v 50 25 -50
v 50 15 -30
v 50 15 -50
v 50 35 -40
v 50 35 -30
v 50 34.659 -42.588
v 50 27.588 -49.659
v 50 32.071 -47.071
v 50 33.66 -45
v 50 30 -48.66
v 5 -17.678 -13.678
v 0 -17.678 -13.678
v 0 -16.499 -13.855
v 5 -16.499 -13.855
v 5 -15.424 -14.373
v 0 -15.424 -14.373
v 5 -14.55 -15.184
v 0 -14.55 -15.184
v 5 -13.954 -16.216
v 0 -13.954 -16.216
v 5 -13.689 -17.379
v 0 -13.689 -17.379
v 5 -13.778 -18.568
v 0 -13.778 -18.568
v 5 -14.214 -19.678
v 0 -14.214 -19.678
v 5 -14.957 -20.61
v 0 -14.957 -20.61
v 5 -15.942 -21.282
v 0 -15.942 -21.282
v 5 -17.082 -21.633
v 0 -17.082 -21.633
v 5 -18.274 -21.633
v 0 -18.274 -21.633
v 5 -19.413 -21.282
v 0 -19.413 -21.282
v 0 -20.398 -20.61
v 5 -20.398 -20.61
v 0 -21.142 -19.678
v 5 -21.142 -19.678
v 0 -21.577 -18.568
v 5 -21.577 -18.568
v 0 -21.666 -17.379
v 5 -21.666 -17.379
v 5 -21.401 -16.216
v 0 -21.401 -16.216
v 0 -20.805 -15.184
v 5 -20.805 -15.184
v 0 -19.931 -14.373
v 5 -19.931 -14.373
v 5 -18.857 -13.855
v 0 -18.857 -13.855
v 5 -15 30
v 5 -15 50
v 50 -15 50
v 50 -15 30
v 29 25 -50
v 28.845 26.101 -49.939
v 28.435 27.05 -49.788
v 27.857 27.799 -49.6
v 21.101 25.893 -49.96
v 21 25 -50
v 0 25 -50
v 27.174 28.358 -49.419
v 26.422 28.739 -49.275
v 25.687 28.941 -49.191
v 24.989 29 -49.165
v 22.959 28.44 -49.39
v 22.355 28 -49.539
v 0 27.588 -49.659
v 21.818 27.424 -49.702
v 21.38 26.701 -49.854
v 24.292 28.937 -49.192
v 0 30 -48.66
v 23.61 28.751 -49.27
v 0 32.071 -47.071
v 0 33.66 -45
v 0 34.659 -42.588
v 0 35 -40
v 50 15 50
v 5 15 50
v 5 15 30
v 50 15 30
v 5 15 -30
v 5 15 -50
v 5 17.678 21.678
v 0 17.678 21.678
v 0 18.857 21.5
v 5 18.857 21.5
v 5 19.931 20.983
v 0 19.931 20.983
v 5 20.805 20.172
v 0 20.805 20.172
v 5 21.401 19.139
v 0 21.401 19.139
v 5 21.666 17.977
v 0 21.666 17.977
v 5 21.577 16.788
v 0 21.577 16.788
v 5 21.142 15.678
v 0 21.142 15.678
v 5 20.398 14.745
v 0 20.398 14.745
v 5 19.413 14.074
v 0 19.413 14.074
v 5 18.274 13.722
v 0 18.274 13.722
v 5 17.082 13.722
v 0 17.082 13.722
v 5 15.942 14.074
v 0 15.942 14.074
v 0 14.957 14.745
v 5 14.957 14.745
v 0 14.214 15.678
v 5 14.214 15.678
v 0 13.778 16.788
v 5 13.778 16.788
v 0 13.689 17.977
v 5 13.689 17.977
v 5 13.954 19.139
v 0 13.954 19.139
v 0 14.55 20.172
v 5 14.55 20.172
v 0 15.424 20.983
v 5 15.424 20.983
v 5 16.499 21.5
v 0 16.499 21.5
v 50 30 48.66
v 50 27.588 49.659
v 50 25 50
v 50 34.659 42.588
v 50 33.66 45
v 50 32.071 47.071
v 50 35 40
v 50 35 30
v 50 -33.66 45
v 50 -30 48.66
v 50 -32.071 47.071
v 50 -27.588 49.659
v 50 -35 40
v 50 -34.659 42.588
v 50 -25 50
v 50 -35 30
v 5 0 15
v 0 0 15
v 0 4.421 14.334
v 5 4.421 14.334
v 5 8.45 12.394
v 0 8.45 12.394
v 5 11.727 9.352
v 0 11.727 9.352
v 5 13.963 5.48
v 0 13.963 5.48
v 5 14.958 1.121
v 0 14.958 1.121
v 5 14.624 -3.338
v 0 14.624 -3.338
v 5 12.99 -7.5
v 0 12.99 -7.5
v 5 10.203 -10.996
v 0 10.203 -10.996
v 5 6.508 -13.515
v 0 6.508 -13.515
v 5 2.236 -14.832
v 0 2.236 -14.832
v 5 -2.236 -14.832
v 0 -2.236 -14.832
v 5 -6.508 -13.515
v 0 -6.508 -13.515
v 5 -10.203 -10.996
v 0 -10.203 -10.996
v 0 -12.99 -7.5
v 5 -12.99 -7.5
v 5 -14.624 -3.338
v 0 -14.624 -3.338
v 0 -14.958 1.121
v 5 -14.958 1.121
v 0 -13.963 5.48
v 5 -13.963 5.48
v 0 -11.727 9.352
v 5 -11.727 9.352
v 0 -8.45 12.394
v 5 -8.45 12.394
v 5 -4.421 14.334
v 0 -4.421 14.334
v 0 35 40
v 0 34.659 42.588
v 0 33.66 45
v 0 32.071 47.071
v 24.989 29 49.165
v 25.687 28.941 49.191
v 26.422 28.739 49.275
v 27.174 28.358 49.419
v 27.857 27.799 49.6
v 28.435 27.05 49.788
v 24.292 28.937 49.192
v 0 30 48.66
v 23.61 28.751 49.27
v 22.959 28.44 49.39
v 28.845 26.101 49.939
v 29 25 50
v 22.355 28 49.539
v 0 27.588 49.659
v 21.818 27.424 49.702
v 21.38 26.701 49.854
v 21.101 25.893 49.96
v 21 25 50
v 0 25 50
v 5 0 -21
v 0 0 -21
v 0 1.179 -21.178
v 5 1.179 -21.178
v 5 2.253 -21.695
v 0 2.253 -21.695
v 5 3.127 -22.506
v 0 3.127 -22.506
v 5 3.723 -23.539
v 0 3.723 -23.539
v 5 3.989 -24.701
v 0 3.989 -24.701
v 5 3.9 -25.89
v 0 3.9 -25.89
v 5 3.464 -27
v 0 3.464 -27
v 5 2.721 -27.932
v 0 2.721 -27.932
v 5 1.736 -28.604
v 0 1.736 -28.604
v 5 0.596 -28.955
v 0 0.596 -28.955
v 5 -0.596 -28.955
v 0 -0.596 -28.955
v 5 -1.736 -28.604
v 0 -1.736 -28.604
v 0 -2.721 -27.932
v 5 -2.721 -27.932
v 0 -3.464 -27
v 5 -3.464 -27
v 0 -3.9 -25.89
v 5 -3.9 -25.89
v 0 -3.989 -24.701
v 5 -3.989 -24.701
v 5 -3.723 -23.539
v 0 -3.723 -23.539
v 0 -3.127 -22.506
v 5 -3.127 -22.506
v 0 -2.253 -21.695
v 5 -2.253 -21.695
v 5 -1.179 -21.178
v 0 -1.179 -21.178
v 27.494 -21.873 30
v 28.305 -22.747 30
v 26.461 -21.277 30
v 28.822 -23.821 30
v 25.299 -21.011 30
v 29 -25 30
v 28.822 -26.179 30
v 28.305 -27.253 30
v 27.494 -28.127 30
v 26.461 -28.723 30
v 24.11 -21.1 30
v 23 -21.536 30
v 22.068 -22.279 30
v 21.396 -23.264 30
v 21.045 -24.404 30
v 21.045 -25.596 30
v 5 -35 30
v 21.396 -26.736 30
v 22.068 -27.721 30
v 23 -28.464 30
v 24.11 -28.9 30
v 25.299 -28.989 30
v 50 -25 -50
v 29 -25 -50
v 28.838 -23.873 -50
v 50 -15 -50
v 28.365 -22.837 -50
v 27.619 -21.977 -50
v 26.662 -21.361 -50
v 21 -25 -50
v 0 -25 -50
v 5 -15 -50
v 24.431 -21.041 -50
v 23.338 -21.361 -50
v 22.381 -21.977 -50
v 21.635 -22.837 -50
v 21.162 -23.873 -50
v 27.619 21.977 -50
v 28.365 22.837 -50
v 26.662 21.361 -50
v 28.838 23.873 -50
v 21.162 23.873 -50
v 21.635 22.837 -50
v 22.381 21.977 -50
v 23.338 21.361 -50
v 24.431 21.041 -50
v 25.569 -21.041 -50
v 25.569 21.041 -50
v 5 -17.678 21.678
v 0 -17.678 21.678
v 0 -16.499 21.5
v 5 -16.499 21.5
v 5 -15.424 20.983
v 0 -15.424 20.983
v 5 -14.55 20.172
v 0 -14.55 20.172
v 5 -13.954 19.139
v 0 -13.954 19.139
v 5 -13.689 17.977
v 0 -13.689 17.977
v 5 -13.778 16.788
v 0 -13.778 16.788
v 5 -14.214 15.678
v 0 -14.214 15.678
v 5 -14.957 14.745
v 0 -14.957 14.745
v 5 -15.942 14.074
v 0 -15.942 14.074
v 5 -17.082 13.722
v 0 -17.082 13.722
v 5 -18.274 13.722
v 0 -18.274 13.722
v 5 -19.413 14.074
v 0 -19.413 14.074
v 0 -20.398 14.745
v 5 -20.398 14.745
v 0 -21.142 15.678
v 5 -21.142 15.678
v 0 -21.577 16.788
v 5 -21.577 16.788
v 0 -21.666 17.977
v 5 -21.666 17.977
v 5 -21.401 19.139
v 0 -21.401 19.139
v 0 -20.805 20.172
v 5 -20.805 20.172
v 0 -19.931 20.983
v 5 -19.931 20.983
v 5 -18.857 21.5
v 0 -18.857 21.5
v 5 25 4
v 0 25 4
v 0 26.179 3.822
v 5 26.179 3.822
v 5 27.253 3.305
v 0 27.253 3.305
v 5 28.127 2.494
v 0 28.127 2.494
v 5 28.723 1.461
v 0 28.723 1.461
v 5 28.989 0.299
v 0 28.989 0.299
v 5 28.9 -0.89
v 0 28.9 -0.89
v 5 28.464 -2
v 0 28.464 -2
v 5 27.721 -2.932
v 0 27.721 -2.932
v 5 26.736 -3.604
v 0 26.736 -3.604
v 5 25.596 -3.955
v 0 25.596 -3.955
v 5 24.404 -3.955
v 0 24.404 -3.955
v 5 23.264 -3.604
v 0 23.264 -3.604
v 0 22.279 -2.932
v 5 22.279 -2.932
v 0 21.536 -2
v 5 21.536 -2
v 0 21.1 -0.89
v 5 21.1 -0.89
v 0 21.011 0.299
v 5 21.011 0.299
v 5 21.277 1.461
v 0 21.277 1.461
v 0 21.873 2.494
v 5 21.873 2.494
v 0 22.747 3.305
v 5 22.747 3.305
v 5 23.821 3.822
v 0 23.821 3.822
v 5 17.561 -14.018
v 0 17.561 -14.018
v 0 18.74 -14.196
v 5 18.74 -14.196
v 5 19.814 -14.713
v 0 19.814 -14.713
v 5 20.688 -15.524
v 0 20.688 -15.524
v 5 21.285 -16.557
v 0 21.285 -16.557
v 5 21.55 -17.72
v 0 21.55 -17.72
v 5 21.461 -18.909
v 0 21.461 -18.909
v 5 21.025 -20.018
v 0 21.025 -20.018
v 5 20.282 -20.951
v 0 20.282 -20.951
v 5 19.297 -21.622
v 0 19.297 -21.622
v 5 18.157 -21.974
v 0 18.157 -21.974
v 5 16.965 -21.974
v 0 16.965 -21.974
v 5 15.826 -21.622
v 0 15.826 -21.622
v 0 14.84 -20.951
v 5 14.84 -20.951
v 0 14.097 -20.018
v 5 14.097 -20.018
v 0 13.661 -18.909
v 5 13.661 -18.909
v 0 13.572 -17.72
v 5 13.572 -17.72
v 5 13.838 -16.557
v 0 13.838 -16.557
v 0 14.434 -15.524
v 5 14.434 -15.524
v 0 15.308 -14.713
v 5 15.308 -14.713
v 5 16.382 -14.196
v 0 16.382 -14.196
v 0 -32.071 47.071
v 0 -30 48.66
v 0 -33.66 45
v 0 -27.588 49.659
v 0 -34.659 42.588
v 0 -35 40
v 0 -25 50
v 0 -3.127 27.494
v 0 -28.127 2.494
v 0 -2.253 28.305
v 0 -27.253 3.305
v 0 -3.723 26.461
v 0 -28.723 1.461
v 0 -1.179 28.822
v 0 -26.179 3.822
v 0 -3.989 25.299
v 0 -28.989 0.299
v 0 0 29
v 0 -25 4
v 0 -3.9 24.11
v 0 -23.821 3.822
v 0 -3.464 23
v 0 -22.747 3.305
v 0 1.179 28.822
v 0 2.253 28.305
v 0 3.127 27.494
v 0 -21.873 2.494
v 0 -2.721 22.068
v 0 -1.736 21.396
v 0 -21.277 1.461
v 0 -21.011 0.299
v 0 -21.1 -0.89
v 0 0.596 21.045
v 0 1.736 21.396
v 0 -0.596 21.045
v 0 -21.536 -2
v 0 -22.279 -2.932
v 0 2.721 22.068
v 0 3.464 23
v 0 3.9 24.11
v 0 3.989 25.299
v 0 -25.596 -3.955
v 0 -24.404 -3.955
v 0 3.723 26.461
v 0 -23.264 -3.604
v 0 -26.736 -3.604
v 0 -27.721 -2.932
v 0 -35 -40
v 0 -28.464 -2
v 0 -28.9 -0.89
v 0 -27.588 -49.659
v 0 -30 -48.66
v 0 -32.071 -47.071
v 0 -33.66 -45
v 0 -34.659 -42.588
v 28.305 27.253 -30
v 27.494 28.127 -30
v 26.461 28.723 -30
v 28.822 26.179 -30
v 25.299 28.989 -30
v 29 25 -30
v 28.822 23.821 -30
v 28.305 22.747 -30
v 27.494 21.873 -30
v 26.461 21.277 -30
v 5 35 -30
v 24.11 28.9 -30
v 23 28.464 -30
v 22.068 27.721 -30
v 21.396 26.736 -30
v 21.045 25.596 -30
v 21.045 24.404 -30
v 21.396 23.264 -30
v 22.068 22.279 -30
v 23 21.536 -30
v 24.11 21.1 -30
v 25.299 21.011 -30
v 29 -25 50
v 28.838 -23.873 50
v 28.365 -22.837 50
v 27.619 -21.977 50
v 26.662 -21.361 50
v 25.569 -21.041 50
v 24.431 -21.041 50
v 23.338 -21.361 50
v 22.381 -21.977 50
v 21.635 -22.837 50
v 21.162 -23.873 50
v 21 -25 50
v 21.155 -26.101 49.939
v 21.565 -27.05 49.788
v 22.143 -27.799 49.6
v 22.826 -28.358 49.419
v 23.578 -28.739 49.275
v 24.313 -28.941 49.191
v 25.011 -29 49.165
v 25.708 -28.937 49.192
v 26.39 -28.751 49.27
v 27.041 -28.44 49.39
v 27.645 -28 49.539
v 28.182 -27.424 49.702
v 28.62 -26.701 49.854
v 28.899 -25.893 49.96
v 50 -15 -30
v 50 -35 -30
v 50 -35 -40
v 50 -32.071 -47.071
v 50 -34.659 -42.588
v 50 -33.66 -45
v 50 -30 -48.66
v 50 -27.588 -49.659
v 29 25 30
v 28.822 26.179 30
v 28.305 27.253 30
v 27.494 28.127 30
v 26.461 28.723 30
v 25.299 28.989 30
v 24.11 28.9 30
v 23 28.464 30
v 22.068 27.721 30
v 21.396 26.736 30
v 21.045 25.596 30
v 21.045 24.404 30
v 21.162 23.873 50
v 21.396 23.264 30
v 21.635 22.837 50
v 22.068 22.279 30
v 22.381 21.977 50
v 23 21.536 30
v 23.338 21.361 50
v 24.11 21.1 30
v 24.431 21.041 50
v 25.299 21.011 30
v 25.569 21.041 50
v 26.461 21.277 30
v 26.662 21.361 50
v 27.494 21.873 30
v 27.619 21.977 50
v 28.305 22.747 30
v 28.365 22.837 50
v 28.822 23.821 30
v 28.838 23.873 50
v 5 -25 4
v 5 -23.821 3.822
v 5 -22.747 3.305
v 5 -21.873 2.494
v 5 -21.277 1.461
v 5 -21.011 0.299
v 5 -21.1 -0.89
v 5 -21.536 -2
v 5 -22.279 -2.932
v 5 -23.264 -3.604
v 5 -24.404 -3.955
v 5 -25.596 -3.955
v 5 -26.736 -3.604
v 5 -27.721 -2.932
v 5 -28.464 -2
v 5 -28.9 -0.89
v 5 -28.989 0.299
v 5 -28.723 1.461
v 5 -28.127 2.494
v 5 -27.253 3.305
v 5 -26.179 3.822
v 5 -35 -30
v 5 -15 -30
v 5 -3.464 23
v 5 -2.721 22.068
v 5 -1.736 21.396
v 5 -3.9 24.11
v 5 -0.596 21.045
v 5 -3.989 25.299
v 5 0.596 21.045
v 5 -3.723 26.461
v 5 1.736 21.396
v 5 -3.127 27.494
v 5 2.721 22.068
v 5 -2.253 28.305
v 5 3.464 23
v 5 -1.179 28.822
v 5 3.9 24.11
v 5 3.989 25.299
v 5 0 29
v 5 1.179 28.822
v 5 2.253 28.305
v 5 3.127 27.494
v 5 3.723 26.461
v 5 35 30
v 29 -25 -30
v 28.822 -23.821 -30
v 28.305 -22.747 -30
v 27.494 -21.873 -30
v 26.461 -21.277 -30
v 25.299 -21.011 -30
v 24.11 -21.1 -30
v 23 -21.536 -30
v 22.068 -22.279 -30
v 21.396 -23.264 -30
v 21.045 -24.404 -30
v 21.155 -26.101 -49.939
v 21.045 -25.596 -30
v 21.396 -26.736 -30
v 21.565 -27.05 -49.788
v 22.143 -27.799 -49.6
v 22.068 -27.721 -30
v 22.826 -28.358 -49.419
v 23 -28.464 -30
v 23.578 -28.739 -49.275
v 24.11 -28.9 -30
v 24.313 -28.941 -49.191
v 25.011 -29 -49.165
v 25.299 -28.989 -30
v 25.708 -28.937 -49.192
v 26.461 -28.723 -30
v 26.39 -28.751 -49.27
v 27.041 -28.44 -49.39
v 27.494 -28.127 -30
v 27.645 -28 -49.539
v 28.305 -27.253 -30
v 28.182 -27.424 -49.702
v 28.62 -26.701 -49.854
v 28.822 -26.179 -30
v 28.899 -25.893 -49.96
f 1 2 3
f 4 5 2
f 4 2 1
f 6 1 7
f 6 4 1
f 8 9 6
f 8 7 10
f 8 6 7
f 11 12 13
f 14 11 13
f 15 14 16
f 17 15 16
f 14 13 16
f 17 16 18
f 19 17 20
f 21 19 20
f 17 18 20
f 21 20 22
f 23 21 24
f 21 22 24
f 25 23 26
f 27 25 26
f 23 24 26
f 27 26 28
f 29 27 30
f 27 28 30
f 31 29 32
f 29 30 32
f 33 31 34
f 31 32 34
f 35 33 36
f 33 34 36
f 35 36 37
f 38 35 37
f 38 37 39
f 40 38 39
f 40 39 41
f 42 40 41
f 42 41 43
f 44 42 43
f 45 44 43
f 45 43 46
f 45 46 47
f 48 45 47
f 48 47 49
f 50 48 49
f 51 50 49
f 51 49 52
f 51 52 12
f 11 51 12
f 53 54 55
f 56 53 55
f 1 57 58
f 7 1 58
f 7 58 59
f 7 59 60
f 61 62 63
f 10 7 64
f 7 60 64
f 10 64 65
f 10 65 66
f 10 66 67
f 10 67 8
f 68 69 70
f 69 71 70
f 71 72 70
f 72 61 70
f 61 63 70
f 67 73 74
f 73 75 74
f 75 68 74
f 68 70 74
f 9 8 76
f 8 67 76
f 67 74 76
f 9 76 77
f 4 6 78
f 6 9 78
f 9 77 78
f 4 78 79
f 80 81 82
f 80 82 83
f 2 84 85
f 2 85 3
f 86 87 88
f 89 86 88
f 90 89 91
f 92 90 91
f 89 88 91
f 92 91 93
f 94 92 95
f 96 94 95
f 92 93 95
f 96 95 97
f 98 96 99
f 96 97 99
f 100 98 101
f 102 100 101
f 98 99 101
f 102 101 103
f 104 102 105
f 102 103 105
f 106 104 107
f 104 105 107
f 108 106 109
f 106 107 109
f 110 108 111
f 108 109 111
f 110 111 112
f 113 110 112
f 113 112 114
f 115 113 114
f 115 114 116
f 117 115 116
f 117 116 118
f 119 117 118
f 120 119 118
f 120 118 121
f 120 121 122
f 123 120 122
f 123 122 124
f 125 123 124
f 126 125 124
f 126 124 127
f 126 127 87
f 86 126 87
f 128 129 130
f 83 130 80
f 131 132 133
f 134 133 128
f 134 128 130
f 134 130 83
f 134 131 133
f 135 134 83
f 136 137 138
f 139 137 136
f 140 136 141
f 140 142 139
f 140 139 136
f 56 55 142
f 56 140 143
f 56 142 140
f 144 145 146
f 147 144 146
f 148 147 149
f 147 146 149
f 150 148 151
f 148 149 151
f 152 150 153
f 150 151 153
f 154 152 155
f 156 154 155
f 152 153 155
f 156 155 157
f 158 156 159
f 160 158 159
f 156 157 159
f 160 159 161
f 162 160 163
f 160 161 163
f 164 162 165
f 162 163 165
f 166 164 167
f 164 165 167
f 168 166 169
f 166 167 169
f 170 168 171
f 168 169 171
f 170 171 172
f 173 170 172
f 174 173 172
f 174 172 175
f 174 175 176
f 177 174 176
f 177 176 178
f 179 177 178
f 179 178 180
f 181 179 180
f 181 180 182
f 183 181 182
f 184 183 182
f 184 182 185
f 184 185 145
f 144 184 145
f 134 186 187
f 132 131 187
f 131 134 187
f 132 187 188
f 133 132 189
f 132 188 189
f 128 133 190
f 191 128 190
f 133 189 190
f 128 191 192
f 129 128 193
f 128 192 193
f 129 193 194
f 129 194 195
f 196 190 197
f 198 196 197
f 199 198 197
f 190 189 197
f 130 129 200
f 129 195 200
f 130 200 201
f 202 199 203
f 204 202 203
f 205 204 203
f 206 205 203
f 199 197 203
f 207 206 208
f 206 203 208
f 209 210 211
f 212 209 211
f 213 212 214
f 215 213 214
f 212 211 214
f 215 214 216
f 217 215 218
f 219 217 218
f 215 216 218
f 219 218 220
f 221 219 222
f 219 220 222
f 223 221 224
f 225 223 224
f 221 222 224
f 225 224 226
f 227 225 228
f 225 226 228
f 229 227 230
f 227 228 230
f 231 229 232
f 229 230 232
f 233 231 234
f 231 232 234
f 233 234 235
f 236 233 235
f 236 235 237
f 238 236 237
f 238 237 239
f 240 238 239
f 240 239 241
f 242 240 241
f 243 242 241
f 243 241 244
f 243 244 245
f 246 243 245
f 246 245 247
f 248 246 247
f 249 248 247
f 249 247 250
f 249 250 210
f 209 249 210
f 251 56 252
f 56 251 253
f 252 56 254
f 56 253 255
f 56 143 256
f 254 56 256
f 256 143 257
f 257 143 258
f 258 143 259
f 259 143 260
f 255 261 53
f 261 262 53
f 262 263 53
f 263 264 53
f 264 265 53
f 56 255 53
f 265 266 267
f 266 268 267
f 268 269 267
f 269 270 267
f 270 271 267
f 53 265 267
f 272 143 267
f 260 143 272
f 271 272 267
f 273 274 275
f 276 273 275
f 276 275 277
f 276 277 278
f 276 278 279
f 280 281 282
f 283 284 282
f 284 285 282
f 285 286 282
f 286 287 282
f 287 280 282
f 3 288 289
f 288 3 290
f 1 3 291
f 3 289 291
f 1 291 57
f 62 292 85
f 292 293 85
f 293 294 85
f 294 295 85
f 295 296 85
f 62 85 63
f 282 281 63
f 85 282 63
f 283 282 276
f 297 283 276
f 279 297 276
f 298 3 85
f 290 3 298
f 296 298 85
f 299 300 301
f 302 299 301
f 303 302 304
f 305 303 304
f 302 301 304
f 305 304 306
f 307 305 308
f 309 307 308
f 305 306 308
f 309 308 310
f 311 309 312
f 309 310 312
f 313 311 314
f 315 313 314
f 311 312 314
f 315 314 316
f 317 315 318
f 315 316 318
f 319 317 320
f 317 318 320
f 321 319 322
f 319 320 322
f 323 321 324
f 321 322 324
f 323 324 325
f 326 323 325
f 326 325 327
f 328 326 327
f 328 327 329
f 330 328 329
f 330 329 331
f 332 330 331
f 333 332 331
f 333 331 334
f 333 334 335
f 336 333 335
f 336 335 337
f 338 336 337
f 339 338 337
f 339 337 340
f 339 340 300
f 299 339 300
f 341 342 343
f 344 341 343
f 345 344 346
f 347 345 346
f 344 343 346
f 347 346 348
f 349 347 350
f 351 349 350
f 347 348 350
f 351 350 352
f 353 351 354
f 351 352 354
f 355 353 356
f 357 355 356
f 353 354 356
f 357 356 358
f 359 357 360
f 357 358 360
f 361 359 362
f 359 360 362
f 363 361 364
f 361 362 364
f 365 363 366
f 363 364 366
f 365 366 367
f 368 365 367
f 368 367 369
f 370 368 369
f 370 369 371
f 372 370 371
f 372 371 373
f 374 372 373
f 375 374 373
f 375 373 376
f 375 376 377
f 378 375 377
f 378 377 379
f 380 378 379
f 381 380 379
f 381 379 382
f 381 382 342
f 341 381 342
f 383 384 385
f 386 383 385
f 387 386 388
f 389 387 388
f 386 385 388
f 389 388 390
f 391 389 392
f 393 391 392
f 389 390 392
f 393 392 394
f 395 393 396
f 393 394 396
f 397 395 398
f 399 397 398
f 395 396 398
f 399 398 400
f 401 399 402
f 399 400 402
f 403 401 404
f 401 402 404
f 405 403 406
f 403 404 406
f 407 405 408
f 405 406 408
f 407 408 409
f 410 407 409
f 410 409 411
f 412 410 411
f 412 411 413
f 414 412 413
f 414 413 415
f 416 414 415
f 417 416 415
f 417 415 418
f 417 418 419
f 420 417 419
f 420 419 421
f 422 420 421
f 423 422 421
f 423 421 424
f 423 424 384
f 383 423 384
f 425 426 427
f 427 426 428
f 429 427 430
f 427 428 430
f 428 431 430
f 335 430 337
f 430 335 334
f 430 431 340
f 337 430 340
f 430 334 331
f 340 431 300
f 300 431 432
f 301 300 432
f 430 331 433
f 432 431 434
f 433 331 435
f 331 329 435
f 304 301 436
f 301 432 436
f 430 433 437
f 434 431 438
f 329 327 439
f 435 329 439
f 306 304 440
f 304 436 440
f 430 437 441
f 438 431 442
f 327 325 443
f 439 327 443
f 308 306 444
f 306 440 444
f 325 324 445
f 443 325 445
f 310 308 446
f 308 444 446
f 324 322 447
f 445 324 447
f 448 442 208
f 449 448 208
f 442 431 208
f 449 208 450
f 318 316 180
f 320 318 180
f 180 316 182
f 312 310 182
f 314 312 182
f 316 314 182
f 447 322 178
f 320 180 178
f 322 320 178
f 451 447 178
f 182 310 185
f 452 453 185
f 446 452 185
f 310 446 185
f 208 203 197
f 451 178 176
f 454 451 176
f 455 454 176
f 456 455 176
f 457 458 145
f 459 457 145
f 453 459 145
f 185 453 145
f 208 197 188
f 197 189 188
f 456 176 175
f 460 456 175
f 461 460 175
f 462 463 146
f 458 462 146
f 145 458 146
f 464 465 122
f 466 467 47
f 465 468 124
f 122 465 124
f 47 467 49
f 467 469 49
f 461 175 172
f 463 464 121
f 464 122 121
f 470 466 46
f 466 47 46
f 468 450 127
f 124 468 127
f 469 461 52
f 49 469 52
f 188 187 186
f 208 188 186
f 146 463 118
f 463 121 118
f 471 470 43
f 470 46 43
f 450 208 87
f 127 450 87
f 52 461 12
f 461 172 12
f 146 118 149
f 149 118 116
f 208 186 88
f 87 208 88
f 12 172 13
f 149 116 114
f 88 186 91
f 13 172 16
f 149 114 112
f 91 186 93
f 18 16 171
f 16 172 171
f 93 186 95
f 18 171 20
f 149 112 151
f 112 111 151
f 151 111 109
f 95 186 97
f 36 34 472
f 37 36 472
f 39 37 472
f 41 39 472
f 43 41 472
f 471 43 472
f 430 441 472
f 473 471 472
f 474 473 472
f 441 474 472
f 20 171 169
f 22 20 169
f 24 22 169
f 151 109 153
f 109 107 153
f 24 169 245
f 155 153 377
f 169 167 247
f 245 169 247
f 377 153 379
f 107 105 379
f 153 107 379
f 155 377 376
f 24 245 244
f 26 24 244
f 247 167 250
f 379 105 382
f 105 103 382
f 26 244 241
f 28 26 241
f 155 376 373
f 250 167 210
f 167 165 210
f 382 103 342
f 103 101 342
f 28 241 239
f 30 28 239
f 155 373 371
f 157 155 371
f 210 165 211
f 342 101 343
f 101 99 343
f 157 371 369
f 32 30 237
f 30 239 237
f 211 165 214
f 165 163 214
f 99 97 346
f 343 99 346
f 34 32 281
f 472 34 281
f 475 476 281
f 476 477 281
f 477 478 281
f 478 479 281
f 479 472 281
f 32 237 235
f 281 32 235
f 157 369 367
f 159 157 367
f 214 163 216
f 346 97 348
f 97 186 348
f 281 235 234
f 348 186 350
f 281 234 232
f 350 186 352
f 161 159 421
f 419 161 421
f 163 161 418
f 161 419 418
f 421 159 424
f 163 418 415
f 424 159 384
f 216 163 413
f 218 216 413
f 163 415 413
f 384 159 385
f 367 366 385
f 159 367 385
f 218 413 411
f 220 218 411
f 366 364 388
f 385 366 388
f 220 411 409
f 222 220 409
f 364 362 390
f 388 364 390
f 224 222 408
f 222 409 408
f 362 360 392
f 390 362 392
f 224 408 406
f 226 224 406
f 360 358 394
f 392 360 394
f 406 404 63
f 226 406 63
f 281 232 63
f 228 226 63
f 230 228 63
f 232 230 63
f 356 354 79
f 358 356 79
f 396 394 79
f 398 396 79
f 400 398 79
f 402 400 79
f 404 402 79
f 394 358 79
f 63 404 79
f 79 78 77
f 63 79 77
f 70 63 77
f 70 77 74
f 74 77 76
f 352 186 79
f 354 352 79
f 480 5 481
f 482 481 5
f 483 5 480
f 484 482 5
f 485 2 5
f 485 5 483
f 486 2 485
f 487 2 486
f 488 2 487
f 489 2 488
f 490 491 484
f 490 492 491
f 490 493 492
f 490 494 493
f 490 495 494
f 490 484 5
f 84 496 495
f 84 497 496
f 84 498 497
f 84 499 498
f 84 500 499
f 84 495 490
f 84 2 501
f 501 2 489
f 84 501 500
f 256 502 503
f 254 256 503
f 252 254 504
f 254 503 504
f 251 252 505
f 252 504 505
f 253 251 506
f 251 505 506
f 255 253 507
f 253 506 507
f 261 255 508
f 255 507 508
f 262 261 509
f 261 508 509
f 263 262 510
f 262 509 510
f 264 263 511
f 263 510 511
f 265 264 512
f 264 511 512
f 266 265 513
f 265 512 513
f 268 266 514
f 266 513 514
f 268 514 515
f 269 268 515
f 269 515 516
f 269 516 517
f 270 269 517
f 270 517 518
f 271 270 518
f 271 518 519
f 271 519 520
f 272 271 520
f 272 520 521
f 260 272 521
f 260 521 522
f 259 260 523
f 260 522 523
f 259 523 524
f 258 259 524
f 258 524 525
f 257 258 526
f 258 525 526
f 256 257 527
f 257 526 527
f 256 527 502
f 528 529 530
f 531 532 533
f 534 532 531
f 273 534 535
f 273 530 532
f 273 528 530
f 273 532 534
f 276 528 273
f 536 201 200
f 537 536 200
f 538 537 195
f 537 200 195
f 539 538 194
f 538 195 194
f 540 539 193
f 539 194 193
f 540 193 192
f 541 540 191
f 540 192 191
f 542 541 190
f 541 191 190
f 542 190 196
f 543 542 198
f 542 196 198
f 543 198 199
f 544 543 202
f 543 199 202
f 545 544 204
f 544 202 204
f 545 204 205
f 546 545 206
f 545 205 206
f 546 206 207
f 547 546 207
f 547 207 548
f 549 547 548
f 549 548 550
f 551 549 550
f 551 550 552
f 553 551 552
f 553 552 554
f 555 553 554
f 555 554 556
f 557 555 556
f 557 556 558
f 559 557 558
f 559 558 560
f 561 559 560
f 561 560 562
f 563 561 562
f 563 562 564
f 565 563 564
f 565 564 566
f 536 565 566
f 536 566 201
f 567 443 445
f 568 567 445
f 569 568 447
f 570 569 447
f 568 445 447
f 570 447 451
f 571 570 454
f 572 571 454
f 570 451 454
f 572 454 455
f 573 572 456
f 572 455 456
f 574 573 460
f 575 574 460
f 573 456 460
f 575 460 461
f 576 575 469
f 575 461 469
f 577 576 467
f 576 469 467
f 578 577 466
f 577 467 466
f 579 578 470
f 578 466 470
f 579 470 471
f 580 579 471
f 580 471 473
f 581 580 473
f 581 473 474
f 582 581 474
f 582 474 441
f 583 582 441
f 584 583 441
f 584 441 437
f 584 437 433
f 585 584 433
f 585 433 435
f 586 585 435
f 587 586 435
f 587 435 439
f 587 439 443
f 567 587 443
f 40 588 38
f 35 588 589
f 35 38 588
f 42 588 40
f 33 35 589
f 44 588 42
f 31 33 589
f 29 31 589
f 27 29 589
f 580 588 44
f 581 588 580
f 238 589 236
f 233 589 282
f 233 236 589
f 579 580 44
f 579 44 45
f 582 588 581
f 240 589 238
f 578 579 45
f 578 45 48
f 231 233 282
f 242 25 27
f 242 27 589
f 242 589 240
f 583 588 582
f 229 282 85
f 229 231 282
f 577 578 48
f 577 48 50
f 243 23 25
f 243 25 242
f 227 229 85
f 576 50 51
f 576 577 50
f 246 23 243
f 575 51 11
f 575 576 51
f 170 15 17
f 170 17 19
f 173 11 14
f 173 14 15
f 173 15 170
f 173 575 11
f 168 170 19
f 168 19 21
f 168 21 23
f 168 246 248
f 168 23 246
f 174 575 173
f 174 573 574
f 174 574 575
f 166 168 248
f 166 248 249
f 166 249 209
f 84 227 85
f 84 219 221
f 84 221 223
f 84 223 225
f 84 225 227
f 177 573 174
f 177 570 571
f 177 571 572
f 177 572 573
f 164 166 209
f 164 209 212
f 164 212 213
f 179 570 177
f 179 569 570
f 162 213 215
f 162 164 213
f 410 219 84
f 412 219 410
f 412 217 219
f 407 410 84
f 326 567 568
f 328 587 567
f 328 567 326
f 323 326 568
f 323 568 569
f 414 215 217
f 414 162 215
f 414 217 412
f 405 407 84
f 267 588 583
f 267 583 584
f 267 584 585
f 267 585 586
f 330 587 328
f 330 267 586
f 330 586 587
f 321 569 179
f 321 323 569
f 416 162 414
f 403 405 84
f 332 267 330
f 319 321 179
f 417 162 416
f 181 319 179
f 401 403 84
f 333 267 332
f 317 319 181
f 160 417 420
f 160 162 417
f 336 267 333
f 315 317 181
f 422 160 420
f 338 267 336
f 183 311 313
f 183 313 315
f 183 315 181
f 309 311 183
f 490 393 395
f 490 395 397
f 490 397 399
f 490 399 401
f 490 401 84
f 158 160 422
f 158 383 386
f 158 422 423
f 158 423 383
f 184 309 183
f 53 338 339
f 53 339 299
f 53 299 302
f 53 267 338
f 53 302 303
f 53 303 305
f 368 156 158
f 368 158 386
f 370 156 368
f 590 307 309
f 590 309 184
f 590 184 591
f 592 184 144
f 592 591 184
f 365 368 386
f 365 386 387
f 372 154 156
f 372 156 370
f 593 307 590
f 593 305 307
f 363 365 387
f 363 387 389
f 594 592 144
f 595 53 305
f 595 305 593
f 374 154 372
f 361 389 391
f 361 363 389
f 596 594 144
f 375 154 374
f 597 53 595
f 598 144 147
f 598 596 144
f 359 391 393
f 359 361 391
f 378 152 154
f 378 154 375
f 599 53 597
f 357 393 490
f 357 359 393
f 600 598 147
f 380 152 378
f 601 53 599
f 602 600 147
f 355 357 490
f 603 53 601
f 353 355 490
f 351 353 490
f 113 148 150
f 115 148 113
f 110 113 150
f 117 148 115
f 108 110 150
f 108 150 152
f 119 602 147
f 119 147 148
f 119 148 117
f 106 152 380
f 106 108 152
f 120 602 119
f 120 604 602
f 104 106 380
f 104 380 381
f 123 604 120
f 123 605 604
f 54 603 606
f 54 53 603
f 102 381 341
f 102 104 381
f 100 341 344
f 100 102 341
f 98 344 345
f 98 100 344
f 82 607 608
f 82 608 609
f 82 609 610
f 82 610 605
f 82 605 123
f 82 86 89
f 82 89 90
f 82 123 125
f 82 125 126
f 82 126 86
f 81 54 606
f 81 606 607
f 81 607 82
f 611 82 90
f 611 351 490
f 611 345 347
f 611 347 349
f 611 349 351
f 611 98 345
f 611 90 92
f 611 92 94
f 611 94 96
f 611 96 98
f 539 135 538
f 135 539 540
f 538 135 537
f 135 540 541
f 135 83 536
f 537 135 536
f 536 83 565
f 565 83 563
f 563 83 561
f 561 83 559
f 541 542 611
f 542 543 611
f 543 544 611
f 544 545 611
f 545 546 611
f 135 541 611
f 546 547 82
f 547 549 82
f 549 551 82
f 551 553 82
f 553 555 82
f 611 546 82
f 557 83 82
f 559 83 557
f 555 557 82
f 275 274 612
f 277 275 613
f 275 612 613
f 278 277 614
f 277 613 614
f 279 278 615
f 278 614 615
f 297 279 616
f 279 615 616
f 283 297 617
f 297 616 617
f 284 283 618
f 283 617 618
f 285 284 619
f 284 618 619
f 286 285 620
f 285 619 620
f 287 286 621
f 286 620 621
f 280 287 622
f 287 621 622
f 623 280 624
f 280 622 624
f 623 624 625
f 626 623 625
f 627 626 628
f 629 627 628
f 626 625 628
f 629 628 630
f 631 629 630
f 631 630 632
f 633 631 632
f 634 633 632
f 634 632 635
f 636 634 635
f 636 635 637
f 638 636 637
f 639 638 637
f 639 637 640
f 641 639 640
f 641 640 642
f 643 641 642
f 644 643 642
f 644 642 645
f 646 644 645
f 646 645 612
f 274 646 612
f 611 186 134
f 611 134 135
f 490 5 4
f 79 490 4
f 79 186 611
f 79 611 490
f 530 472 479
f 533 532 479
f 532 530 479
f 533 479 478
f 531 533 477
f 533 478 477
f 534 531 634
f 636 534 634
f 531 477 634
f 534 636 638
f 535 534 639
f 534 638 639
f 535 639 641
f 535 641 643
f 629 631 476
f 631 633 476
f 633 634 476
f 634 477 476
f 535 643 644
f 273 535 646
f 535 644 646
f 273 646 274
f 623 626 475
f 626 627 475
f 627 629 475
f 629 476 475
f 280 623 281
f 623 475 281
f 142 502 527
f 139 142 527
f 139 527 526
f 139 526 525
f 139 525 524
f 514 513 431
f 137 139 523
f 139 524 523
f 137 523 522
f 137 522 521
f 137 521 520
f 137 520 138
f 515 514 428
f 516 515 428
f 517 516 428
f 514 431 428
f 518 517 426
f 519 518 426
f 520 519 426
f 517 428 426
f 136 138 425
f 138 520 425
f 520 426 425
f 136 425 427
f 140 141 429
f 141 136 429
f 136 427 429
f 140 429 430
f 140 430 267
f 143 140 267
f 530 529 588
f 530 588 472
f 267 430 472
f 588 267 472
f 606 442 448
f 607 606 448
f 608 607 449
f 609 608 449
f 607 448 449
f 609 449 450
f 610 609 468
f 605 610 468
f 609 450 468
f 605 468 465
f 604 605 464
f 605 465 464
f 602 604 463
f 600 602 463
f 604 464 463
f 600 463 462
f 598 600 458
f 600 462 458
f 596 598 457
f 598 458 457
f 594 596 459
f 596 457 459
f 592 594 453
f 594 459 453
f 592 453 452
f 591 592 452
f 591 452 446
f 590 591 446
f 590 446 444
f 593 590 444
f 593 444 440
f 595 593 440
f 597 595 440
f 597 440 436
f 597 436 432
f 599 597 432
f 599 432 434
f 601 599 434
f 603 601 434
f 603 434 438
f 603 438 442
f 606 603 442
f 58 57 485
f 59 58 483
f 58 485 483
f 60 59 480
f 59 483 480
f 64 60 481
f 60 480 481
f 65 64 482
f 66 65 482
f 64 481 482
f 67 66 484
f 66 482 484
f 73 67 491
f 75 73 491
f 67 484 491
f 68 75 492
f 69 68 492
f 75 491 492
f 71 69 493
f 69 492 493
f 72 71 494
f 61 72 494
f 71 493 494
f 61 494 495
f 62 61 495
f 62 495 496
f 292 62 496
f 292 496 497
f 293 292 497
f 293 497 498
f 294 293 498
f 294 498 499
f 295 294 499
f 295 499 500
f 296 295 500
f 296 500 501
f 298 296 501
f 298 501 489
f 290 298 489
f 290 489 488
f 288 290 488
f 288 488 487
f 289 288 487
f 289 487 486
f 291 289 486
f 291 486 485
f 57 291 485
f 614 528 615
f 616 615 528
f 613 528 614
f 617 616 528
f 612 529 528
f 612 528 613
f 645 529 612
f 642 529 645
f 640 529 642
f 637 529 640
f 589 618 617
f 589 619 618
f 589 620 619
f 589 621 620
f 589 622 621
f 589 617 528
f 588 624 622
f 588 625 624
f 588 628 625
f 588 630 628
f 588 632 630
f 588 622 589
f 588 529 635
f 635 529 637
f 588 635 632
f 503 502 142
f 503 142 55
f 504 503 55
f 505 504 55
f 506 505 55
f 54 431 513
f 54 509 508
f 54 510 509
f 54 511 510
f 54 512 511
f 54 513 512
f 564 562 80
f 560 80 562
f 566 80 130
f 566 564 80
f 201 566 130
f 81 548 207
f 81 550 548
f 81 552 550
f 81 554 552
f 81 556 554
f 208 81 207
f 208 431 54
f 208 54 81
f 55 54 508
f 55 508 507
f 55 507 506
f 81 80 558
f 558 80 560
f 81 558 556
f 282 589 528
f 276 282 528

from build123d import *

# Parameters (mm, degrees)
ESBO_O1_W                = 100
ESBO_O1_H                = 70
RESSALTO_EXTRUS_O1_DEPTH = 50
ESBO_O3_W                = 45
ESBO_O3_H                = 30
CORTE_EXTRUS_O1_DEPTH    = 118.153745139
ESBO_O4_W                = 45
ESBO_O4_H                = 60
CORTE_EXTRUS_O2_DEPTH    = 100.498743711
ESBO_O5_R                = 15
CORTE_EXTRUS_O3_DEPTH    = 79.89866919
ESBO_O6_R                = 4
CORTE_EXTRUS_O4_DEPTH    = 79.89866919
ESBO_O6_3_R              = 4
CORTE_EXTRUS_O5_DEPTH    = 50
ESBO_O6_4_R              = 4
CORTE_EXTRUS_O6_DEPTH    = 50
ESBO_O6_5_R              = 4
CORTE_EXTRUS_O7_DEPTH    = 50
ESBO_O6_6_R              = 4
CORTE_EXTRUS_O8_DEPTH    = 50
ESBO_O6_7_R              = 4
CORTE_EXTRUS_O9_DEPTH    = 50
ESBO_O6_8_R              = 4
CORTE_EXTRUS_O10_DEPTH   = 50
ESBO_O8_R                = 4
CORTE_EXTRUS_O11_DEPTH   = 50
ESBO_O9_R                = 4
CORTE_EXTRUS_O12_DEPTH   = 118.153745139
ESBO_O10_R               = 4
CORTE_EXTRUS_O13_DEPTH   = 118.153745139
FILETE2_R                = 10
FILETE3_R                = 10
FILETE4_R                = 10
FILETE5_R                = 10


with BuildPart() as part:
    # Esboço1 → Ressalto-extrusão1 (new body)
    with BuildSketch(Plane(origin=(0, 0, 0), x_dir=(0, 0, -1), z_dir=(1, 0, 0))):
        Rectangle(ESBO_O1_W, ESBO_O1_H)
    extrude(amount=RESSALTO_EXTRUS_O1_DEPTH)

    # Esboço3 → Corte-extrusão1 (cut, through all)
    with BuildSketch(Plane.XY.offset(50)):
        with Locations((27.5, 0)):
            Rectangle(ESBO_O3_W, ESBO_O3_H)
    extrude(amount=-CORTE_EXTRUS_O1_DEPTH, mode=Mode.SUBTRACT)

    # Esboço4 → Corte-extrusão2 (cut, through all)
    with BuildSketch(Plane(origin=(0, -35, 0), x_dir=(-1, 0, 0), z_dir=(0, -1, 0))):
        with Locations((-27.5, 0)):
            Rectangle(ESBO_O4_W, ESBO_O4_H)
    extrude(amount=-CORTE_EXTRUS_O2_DEPTH, mode=Mode.SUBTRACT)

    # Esboço5 → Corte-extrusão3 (cut, through all)
    with BuildSketch(Plane.ZY):
        Circle(ESBO_O5_R)
    extrude(amount=-CORTE_EXTRUS_O3_DEPTH, mode=Mode.SUBTRACT)

    # Esboço6 → Corte-extrusão4 (cut, through all)
    with BuildSketch(Plane.ZY):
        with Locations((-25, 0)):
            Circle(ESBO_O6_R)
    extrude(amount=-CORTE_EXTRUS_O4_DEPTH, mode=Mode.SUBTRACT)

    # Esboço6<3> → Corte-extrusão5 (cut)
    with BuildSketch(Plane.ZY):
        with Locations((-17.67766953, -17.67766953)):
            Circle(ESBO_O6_3_R)
    extrude(amount=-CORTE_EXTRUS_O5_DEPTH, mode=Mode.SUBTRACT)

    # Esboço6<4> → Corte-extrusão6 (cut)
    with BuildSketch(Plane.ZY):
        with Locations((0, -25)):
            Circle(ESBO_O6_4_R)
    extrude(amount=-CORTE_EXTRUS_O6_DEPTH, mode=Mode.SUBTRACT)

    # Esboço6<5> → Corte-extrusão7 (cut)
    with BuildSketch(Plane.ZY):
        with Locations((17.67766953, -17.67766953)):
            Circle(ESBO_O6_5_R)
    extrude(amount=-CORTE_EXTRUS_O7_DEPTH, mode=Mode.SUBTRACT)

    # Esboço6<6> → Corte-extrusão8 (cut)
    with BuildSketch(Plane.ZY):
        with Locations((25, 0)):
            Circle(ESBO_O6_6_R)
    extrude(amount=-CORTE_EXTRUS_O8_DEPTH, mode=Mode.SUBTRACT)

    # Esboço6<7> → Corte-extrusão9 (cut)
    with BuildSketch(Plane.ZY):
        with Locations((17.67766953, 17.67766953)):
            Circle(ESBO_O6_7_R)
    extrude(amount=-CORTE_EXTRUS_O9_DEPTH, mode=Mode.SUBTRACT)

    # Esboço6<8> → Corte-extrusão10 (cut)
    with BuildSketch(Plane.ZY):
        with Locations((0, 25)):
            Circle(ESBO_O6_8_R)
    extrude(amount=-CORTE_EXTRUS_O10_DEPTH, mode=Mode.SUBTRACT)

    # Esboço8 → Corte-extrusão11 (cut)
    with BuildSketch(Plane.ZY):
        with Locations((-18.018451128, 17.56107414)):
            Circle(ESBO_O8_R)
    extrude(amount=-CORTE_EXTRUS_O11_DEPTH, mode=Mode.SUBTRACT)

    # Esboço9 → Corte-extrusão12 (cut, through all)
    with BuildSketch(Plane.XY.offset(50)):
        with Locations((25, -25)):
            Circle(ESBO_O9_R)
    extrude(amount=-CORTE_EXTRUS_O12_DEPTH, mode=Mode.SUBTRACT)

    # Esboço10 → Corte-extrusão13 (cut, through all)
    with BuildSketch(Plane.XY.offset(50)):
        with Locations((25, 25)):
            Circle(ESBO_O10_R)
    extrude(amount=-CORTE_EXTRUS_O13_DEPTH, mode=Mode.SUBTRACT)

    # Filete2
    # the kernel refuses this fillet: 10 mm, written as the material it takes off along each edge
    with BuildSketch(Plane(origin=(-25, -35, 50), x_dir=(0, 1, 0), z_dir=(1, 0, 0))) as filete2_piece_1:
        with BuildLine():
            CenterArc((FILETE2_R, -FILETE2_R), FILETE2_R, 90, 90)
            Line((0, -FILETE2_R), (0, 0))
            Line((0, 0), (FILETE2_R, 0))
        make_face()
    extrude(amount=100, mode=Mode.SUBTRACT)

    # Filete3
    # the kernel refuses this fillet: 10 mm, written as the material it takes off along each edge
    with BuildSketch(Plane(origin=(-25, 35, 50), x_dir=(0, 0, -1), z_dir=(1, 0, 0))) as filete3_piece_1:
        with BuildLine():
            CenterArc((FILETE3_R, -FILETE3_R), FILETE3_R, 90, 90)
            Line((0, -FILETE3_R), (0, 0))
            Line((0, 0), (FILETE3_R, 0))
        make_face()
    extrude(amount=100, mode=Mode.SUBTRACT)

    # Filete4
    # the kernel refuses this fillet: 10 mm, written as the material it takes off along each edge
    with BuildSketch(Plane(origin=(-25, 35, -50), x_dir=(0, 0, 1), z_dir=(1, 0, 0))) as filete4_piece_1:
        with BuildLine():
            CenterArc((FILETE4_R, FILETE4_R), FILETE4_R, 180, 90)
            Line((0, FILETE4_R), (0, 0))
            Line((0, 0), (FILETE4_R, 0))
        make_face()
    extrude(amount=100, mode=Mode.SUBTRACT)

    # Filete5
    # the kernel refuses this fillet: 10 mm, written as the material it takes off along each edge
    with BuildSketch(Plane(origin=(-25, -35, -50), x_dir=(0, 0, 1), z_dir=(1, 0, 0))) as filete5_piece_1:
        with BuildLine():
            CenterArc((FILETE5_R, -FILETE5_R), FILETE5_R, 90, 90)
            Line((0, -FILETE5_R), (0, 0))
            Line((0, 0), (FILETE5_R, 0))
        make_face()
    extrude(amount=100, mode=Mode.SUBTRACT)


solid = part.part
